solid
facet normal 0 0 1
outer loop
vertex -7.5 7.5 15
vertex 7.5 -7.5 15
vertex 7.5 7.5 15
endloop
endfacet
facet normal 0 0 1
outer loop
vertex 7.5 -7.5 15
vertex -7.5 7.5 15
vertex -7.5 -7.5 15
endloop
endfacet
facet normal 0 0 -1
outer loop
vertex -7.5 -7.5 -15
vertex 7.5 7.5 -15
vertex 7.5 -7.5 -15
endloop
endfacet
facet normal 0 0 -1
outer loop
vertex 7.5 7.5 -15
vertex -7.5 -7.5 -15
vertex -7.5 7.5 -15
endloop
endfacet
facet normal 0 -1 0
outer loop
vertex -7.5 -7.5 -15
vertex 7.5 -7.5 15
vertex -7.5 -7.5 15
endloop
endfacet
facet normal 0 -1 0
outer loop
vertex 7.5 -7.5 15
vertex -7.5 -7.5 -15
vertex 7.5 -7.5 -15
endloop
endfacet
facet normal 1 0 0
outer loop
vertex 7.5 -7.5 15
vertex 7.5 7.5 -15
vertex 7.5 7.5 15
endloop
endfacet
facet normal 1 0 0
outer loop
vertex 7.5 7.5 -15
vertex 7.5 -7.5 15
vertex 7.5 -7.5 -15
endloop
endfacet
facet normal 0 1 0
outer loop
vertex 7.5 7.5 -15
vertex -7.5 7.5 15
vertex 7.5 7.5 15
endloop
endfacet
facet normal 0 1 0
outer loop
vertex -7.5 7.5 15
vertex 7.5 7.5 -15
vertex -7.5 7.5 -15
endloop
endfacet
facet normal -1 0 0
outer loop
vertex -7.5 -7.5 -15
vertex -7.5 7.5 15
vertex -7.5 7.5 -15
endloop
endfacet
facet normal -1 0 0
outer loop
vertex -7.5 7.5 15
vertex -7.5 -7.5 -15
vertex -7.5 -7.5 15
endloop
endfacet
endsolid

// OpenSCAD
// Generated by generate_scads.py
cube(size=[15,15,30], center=true);
